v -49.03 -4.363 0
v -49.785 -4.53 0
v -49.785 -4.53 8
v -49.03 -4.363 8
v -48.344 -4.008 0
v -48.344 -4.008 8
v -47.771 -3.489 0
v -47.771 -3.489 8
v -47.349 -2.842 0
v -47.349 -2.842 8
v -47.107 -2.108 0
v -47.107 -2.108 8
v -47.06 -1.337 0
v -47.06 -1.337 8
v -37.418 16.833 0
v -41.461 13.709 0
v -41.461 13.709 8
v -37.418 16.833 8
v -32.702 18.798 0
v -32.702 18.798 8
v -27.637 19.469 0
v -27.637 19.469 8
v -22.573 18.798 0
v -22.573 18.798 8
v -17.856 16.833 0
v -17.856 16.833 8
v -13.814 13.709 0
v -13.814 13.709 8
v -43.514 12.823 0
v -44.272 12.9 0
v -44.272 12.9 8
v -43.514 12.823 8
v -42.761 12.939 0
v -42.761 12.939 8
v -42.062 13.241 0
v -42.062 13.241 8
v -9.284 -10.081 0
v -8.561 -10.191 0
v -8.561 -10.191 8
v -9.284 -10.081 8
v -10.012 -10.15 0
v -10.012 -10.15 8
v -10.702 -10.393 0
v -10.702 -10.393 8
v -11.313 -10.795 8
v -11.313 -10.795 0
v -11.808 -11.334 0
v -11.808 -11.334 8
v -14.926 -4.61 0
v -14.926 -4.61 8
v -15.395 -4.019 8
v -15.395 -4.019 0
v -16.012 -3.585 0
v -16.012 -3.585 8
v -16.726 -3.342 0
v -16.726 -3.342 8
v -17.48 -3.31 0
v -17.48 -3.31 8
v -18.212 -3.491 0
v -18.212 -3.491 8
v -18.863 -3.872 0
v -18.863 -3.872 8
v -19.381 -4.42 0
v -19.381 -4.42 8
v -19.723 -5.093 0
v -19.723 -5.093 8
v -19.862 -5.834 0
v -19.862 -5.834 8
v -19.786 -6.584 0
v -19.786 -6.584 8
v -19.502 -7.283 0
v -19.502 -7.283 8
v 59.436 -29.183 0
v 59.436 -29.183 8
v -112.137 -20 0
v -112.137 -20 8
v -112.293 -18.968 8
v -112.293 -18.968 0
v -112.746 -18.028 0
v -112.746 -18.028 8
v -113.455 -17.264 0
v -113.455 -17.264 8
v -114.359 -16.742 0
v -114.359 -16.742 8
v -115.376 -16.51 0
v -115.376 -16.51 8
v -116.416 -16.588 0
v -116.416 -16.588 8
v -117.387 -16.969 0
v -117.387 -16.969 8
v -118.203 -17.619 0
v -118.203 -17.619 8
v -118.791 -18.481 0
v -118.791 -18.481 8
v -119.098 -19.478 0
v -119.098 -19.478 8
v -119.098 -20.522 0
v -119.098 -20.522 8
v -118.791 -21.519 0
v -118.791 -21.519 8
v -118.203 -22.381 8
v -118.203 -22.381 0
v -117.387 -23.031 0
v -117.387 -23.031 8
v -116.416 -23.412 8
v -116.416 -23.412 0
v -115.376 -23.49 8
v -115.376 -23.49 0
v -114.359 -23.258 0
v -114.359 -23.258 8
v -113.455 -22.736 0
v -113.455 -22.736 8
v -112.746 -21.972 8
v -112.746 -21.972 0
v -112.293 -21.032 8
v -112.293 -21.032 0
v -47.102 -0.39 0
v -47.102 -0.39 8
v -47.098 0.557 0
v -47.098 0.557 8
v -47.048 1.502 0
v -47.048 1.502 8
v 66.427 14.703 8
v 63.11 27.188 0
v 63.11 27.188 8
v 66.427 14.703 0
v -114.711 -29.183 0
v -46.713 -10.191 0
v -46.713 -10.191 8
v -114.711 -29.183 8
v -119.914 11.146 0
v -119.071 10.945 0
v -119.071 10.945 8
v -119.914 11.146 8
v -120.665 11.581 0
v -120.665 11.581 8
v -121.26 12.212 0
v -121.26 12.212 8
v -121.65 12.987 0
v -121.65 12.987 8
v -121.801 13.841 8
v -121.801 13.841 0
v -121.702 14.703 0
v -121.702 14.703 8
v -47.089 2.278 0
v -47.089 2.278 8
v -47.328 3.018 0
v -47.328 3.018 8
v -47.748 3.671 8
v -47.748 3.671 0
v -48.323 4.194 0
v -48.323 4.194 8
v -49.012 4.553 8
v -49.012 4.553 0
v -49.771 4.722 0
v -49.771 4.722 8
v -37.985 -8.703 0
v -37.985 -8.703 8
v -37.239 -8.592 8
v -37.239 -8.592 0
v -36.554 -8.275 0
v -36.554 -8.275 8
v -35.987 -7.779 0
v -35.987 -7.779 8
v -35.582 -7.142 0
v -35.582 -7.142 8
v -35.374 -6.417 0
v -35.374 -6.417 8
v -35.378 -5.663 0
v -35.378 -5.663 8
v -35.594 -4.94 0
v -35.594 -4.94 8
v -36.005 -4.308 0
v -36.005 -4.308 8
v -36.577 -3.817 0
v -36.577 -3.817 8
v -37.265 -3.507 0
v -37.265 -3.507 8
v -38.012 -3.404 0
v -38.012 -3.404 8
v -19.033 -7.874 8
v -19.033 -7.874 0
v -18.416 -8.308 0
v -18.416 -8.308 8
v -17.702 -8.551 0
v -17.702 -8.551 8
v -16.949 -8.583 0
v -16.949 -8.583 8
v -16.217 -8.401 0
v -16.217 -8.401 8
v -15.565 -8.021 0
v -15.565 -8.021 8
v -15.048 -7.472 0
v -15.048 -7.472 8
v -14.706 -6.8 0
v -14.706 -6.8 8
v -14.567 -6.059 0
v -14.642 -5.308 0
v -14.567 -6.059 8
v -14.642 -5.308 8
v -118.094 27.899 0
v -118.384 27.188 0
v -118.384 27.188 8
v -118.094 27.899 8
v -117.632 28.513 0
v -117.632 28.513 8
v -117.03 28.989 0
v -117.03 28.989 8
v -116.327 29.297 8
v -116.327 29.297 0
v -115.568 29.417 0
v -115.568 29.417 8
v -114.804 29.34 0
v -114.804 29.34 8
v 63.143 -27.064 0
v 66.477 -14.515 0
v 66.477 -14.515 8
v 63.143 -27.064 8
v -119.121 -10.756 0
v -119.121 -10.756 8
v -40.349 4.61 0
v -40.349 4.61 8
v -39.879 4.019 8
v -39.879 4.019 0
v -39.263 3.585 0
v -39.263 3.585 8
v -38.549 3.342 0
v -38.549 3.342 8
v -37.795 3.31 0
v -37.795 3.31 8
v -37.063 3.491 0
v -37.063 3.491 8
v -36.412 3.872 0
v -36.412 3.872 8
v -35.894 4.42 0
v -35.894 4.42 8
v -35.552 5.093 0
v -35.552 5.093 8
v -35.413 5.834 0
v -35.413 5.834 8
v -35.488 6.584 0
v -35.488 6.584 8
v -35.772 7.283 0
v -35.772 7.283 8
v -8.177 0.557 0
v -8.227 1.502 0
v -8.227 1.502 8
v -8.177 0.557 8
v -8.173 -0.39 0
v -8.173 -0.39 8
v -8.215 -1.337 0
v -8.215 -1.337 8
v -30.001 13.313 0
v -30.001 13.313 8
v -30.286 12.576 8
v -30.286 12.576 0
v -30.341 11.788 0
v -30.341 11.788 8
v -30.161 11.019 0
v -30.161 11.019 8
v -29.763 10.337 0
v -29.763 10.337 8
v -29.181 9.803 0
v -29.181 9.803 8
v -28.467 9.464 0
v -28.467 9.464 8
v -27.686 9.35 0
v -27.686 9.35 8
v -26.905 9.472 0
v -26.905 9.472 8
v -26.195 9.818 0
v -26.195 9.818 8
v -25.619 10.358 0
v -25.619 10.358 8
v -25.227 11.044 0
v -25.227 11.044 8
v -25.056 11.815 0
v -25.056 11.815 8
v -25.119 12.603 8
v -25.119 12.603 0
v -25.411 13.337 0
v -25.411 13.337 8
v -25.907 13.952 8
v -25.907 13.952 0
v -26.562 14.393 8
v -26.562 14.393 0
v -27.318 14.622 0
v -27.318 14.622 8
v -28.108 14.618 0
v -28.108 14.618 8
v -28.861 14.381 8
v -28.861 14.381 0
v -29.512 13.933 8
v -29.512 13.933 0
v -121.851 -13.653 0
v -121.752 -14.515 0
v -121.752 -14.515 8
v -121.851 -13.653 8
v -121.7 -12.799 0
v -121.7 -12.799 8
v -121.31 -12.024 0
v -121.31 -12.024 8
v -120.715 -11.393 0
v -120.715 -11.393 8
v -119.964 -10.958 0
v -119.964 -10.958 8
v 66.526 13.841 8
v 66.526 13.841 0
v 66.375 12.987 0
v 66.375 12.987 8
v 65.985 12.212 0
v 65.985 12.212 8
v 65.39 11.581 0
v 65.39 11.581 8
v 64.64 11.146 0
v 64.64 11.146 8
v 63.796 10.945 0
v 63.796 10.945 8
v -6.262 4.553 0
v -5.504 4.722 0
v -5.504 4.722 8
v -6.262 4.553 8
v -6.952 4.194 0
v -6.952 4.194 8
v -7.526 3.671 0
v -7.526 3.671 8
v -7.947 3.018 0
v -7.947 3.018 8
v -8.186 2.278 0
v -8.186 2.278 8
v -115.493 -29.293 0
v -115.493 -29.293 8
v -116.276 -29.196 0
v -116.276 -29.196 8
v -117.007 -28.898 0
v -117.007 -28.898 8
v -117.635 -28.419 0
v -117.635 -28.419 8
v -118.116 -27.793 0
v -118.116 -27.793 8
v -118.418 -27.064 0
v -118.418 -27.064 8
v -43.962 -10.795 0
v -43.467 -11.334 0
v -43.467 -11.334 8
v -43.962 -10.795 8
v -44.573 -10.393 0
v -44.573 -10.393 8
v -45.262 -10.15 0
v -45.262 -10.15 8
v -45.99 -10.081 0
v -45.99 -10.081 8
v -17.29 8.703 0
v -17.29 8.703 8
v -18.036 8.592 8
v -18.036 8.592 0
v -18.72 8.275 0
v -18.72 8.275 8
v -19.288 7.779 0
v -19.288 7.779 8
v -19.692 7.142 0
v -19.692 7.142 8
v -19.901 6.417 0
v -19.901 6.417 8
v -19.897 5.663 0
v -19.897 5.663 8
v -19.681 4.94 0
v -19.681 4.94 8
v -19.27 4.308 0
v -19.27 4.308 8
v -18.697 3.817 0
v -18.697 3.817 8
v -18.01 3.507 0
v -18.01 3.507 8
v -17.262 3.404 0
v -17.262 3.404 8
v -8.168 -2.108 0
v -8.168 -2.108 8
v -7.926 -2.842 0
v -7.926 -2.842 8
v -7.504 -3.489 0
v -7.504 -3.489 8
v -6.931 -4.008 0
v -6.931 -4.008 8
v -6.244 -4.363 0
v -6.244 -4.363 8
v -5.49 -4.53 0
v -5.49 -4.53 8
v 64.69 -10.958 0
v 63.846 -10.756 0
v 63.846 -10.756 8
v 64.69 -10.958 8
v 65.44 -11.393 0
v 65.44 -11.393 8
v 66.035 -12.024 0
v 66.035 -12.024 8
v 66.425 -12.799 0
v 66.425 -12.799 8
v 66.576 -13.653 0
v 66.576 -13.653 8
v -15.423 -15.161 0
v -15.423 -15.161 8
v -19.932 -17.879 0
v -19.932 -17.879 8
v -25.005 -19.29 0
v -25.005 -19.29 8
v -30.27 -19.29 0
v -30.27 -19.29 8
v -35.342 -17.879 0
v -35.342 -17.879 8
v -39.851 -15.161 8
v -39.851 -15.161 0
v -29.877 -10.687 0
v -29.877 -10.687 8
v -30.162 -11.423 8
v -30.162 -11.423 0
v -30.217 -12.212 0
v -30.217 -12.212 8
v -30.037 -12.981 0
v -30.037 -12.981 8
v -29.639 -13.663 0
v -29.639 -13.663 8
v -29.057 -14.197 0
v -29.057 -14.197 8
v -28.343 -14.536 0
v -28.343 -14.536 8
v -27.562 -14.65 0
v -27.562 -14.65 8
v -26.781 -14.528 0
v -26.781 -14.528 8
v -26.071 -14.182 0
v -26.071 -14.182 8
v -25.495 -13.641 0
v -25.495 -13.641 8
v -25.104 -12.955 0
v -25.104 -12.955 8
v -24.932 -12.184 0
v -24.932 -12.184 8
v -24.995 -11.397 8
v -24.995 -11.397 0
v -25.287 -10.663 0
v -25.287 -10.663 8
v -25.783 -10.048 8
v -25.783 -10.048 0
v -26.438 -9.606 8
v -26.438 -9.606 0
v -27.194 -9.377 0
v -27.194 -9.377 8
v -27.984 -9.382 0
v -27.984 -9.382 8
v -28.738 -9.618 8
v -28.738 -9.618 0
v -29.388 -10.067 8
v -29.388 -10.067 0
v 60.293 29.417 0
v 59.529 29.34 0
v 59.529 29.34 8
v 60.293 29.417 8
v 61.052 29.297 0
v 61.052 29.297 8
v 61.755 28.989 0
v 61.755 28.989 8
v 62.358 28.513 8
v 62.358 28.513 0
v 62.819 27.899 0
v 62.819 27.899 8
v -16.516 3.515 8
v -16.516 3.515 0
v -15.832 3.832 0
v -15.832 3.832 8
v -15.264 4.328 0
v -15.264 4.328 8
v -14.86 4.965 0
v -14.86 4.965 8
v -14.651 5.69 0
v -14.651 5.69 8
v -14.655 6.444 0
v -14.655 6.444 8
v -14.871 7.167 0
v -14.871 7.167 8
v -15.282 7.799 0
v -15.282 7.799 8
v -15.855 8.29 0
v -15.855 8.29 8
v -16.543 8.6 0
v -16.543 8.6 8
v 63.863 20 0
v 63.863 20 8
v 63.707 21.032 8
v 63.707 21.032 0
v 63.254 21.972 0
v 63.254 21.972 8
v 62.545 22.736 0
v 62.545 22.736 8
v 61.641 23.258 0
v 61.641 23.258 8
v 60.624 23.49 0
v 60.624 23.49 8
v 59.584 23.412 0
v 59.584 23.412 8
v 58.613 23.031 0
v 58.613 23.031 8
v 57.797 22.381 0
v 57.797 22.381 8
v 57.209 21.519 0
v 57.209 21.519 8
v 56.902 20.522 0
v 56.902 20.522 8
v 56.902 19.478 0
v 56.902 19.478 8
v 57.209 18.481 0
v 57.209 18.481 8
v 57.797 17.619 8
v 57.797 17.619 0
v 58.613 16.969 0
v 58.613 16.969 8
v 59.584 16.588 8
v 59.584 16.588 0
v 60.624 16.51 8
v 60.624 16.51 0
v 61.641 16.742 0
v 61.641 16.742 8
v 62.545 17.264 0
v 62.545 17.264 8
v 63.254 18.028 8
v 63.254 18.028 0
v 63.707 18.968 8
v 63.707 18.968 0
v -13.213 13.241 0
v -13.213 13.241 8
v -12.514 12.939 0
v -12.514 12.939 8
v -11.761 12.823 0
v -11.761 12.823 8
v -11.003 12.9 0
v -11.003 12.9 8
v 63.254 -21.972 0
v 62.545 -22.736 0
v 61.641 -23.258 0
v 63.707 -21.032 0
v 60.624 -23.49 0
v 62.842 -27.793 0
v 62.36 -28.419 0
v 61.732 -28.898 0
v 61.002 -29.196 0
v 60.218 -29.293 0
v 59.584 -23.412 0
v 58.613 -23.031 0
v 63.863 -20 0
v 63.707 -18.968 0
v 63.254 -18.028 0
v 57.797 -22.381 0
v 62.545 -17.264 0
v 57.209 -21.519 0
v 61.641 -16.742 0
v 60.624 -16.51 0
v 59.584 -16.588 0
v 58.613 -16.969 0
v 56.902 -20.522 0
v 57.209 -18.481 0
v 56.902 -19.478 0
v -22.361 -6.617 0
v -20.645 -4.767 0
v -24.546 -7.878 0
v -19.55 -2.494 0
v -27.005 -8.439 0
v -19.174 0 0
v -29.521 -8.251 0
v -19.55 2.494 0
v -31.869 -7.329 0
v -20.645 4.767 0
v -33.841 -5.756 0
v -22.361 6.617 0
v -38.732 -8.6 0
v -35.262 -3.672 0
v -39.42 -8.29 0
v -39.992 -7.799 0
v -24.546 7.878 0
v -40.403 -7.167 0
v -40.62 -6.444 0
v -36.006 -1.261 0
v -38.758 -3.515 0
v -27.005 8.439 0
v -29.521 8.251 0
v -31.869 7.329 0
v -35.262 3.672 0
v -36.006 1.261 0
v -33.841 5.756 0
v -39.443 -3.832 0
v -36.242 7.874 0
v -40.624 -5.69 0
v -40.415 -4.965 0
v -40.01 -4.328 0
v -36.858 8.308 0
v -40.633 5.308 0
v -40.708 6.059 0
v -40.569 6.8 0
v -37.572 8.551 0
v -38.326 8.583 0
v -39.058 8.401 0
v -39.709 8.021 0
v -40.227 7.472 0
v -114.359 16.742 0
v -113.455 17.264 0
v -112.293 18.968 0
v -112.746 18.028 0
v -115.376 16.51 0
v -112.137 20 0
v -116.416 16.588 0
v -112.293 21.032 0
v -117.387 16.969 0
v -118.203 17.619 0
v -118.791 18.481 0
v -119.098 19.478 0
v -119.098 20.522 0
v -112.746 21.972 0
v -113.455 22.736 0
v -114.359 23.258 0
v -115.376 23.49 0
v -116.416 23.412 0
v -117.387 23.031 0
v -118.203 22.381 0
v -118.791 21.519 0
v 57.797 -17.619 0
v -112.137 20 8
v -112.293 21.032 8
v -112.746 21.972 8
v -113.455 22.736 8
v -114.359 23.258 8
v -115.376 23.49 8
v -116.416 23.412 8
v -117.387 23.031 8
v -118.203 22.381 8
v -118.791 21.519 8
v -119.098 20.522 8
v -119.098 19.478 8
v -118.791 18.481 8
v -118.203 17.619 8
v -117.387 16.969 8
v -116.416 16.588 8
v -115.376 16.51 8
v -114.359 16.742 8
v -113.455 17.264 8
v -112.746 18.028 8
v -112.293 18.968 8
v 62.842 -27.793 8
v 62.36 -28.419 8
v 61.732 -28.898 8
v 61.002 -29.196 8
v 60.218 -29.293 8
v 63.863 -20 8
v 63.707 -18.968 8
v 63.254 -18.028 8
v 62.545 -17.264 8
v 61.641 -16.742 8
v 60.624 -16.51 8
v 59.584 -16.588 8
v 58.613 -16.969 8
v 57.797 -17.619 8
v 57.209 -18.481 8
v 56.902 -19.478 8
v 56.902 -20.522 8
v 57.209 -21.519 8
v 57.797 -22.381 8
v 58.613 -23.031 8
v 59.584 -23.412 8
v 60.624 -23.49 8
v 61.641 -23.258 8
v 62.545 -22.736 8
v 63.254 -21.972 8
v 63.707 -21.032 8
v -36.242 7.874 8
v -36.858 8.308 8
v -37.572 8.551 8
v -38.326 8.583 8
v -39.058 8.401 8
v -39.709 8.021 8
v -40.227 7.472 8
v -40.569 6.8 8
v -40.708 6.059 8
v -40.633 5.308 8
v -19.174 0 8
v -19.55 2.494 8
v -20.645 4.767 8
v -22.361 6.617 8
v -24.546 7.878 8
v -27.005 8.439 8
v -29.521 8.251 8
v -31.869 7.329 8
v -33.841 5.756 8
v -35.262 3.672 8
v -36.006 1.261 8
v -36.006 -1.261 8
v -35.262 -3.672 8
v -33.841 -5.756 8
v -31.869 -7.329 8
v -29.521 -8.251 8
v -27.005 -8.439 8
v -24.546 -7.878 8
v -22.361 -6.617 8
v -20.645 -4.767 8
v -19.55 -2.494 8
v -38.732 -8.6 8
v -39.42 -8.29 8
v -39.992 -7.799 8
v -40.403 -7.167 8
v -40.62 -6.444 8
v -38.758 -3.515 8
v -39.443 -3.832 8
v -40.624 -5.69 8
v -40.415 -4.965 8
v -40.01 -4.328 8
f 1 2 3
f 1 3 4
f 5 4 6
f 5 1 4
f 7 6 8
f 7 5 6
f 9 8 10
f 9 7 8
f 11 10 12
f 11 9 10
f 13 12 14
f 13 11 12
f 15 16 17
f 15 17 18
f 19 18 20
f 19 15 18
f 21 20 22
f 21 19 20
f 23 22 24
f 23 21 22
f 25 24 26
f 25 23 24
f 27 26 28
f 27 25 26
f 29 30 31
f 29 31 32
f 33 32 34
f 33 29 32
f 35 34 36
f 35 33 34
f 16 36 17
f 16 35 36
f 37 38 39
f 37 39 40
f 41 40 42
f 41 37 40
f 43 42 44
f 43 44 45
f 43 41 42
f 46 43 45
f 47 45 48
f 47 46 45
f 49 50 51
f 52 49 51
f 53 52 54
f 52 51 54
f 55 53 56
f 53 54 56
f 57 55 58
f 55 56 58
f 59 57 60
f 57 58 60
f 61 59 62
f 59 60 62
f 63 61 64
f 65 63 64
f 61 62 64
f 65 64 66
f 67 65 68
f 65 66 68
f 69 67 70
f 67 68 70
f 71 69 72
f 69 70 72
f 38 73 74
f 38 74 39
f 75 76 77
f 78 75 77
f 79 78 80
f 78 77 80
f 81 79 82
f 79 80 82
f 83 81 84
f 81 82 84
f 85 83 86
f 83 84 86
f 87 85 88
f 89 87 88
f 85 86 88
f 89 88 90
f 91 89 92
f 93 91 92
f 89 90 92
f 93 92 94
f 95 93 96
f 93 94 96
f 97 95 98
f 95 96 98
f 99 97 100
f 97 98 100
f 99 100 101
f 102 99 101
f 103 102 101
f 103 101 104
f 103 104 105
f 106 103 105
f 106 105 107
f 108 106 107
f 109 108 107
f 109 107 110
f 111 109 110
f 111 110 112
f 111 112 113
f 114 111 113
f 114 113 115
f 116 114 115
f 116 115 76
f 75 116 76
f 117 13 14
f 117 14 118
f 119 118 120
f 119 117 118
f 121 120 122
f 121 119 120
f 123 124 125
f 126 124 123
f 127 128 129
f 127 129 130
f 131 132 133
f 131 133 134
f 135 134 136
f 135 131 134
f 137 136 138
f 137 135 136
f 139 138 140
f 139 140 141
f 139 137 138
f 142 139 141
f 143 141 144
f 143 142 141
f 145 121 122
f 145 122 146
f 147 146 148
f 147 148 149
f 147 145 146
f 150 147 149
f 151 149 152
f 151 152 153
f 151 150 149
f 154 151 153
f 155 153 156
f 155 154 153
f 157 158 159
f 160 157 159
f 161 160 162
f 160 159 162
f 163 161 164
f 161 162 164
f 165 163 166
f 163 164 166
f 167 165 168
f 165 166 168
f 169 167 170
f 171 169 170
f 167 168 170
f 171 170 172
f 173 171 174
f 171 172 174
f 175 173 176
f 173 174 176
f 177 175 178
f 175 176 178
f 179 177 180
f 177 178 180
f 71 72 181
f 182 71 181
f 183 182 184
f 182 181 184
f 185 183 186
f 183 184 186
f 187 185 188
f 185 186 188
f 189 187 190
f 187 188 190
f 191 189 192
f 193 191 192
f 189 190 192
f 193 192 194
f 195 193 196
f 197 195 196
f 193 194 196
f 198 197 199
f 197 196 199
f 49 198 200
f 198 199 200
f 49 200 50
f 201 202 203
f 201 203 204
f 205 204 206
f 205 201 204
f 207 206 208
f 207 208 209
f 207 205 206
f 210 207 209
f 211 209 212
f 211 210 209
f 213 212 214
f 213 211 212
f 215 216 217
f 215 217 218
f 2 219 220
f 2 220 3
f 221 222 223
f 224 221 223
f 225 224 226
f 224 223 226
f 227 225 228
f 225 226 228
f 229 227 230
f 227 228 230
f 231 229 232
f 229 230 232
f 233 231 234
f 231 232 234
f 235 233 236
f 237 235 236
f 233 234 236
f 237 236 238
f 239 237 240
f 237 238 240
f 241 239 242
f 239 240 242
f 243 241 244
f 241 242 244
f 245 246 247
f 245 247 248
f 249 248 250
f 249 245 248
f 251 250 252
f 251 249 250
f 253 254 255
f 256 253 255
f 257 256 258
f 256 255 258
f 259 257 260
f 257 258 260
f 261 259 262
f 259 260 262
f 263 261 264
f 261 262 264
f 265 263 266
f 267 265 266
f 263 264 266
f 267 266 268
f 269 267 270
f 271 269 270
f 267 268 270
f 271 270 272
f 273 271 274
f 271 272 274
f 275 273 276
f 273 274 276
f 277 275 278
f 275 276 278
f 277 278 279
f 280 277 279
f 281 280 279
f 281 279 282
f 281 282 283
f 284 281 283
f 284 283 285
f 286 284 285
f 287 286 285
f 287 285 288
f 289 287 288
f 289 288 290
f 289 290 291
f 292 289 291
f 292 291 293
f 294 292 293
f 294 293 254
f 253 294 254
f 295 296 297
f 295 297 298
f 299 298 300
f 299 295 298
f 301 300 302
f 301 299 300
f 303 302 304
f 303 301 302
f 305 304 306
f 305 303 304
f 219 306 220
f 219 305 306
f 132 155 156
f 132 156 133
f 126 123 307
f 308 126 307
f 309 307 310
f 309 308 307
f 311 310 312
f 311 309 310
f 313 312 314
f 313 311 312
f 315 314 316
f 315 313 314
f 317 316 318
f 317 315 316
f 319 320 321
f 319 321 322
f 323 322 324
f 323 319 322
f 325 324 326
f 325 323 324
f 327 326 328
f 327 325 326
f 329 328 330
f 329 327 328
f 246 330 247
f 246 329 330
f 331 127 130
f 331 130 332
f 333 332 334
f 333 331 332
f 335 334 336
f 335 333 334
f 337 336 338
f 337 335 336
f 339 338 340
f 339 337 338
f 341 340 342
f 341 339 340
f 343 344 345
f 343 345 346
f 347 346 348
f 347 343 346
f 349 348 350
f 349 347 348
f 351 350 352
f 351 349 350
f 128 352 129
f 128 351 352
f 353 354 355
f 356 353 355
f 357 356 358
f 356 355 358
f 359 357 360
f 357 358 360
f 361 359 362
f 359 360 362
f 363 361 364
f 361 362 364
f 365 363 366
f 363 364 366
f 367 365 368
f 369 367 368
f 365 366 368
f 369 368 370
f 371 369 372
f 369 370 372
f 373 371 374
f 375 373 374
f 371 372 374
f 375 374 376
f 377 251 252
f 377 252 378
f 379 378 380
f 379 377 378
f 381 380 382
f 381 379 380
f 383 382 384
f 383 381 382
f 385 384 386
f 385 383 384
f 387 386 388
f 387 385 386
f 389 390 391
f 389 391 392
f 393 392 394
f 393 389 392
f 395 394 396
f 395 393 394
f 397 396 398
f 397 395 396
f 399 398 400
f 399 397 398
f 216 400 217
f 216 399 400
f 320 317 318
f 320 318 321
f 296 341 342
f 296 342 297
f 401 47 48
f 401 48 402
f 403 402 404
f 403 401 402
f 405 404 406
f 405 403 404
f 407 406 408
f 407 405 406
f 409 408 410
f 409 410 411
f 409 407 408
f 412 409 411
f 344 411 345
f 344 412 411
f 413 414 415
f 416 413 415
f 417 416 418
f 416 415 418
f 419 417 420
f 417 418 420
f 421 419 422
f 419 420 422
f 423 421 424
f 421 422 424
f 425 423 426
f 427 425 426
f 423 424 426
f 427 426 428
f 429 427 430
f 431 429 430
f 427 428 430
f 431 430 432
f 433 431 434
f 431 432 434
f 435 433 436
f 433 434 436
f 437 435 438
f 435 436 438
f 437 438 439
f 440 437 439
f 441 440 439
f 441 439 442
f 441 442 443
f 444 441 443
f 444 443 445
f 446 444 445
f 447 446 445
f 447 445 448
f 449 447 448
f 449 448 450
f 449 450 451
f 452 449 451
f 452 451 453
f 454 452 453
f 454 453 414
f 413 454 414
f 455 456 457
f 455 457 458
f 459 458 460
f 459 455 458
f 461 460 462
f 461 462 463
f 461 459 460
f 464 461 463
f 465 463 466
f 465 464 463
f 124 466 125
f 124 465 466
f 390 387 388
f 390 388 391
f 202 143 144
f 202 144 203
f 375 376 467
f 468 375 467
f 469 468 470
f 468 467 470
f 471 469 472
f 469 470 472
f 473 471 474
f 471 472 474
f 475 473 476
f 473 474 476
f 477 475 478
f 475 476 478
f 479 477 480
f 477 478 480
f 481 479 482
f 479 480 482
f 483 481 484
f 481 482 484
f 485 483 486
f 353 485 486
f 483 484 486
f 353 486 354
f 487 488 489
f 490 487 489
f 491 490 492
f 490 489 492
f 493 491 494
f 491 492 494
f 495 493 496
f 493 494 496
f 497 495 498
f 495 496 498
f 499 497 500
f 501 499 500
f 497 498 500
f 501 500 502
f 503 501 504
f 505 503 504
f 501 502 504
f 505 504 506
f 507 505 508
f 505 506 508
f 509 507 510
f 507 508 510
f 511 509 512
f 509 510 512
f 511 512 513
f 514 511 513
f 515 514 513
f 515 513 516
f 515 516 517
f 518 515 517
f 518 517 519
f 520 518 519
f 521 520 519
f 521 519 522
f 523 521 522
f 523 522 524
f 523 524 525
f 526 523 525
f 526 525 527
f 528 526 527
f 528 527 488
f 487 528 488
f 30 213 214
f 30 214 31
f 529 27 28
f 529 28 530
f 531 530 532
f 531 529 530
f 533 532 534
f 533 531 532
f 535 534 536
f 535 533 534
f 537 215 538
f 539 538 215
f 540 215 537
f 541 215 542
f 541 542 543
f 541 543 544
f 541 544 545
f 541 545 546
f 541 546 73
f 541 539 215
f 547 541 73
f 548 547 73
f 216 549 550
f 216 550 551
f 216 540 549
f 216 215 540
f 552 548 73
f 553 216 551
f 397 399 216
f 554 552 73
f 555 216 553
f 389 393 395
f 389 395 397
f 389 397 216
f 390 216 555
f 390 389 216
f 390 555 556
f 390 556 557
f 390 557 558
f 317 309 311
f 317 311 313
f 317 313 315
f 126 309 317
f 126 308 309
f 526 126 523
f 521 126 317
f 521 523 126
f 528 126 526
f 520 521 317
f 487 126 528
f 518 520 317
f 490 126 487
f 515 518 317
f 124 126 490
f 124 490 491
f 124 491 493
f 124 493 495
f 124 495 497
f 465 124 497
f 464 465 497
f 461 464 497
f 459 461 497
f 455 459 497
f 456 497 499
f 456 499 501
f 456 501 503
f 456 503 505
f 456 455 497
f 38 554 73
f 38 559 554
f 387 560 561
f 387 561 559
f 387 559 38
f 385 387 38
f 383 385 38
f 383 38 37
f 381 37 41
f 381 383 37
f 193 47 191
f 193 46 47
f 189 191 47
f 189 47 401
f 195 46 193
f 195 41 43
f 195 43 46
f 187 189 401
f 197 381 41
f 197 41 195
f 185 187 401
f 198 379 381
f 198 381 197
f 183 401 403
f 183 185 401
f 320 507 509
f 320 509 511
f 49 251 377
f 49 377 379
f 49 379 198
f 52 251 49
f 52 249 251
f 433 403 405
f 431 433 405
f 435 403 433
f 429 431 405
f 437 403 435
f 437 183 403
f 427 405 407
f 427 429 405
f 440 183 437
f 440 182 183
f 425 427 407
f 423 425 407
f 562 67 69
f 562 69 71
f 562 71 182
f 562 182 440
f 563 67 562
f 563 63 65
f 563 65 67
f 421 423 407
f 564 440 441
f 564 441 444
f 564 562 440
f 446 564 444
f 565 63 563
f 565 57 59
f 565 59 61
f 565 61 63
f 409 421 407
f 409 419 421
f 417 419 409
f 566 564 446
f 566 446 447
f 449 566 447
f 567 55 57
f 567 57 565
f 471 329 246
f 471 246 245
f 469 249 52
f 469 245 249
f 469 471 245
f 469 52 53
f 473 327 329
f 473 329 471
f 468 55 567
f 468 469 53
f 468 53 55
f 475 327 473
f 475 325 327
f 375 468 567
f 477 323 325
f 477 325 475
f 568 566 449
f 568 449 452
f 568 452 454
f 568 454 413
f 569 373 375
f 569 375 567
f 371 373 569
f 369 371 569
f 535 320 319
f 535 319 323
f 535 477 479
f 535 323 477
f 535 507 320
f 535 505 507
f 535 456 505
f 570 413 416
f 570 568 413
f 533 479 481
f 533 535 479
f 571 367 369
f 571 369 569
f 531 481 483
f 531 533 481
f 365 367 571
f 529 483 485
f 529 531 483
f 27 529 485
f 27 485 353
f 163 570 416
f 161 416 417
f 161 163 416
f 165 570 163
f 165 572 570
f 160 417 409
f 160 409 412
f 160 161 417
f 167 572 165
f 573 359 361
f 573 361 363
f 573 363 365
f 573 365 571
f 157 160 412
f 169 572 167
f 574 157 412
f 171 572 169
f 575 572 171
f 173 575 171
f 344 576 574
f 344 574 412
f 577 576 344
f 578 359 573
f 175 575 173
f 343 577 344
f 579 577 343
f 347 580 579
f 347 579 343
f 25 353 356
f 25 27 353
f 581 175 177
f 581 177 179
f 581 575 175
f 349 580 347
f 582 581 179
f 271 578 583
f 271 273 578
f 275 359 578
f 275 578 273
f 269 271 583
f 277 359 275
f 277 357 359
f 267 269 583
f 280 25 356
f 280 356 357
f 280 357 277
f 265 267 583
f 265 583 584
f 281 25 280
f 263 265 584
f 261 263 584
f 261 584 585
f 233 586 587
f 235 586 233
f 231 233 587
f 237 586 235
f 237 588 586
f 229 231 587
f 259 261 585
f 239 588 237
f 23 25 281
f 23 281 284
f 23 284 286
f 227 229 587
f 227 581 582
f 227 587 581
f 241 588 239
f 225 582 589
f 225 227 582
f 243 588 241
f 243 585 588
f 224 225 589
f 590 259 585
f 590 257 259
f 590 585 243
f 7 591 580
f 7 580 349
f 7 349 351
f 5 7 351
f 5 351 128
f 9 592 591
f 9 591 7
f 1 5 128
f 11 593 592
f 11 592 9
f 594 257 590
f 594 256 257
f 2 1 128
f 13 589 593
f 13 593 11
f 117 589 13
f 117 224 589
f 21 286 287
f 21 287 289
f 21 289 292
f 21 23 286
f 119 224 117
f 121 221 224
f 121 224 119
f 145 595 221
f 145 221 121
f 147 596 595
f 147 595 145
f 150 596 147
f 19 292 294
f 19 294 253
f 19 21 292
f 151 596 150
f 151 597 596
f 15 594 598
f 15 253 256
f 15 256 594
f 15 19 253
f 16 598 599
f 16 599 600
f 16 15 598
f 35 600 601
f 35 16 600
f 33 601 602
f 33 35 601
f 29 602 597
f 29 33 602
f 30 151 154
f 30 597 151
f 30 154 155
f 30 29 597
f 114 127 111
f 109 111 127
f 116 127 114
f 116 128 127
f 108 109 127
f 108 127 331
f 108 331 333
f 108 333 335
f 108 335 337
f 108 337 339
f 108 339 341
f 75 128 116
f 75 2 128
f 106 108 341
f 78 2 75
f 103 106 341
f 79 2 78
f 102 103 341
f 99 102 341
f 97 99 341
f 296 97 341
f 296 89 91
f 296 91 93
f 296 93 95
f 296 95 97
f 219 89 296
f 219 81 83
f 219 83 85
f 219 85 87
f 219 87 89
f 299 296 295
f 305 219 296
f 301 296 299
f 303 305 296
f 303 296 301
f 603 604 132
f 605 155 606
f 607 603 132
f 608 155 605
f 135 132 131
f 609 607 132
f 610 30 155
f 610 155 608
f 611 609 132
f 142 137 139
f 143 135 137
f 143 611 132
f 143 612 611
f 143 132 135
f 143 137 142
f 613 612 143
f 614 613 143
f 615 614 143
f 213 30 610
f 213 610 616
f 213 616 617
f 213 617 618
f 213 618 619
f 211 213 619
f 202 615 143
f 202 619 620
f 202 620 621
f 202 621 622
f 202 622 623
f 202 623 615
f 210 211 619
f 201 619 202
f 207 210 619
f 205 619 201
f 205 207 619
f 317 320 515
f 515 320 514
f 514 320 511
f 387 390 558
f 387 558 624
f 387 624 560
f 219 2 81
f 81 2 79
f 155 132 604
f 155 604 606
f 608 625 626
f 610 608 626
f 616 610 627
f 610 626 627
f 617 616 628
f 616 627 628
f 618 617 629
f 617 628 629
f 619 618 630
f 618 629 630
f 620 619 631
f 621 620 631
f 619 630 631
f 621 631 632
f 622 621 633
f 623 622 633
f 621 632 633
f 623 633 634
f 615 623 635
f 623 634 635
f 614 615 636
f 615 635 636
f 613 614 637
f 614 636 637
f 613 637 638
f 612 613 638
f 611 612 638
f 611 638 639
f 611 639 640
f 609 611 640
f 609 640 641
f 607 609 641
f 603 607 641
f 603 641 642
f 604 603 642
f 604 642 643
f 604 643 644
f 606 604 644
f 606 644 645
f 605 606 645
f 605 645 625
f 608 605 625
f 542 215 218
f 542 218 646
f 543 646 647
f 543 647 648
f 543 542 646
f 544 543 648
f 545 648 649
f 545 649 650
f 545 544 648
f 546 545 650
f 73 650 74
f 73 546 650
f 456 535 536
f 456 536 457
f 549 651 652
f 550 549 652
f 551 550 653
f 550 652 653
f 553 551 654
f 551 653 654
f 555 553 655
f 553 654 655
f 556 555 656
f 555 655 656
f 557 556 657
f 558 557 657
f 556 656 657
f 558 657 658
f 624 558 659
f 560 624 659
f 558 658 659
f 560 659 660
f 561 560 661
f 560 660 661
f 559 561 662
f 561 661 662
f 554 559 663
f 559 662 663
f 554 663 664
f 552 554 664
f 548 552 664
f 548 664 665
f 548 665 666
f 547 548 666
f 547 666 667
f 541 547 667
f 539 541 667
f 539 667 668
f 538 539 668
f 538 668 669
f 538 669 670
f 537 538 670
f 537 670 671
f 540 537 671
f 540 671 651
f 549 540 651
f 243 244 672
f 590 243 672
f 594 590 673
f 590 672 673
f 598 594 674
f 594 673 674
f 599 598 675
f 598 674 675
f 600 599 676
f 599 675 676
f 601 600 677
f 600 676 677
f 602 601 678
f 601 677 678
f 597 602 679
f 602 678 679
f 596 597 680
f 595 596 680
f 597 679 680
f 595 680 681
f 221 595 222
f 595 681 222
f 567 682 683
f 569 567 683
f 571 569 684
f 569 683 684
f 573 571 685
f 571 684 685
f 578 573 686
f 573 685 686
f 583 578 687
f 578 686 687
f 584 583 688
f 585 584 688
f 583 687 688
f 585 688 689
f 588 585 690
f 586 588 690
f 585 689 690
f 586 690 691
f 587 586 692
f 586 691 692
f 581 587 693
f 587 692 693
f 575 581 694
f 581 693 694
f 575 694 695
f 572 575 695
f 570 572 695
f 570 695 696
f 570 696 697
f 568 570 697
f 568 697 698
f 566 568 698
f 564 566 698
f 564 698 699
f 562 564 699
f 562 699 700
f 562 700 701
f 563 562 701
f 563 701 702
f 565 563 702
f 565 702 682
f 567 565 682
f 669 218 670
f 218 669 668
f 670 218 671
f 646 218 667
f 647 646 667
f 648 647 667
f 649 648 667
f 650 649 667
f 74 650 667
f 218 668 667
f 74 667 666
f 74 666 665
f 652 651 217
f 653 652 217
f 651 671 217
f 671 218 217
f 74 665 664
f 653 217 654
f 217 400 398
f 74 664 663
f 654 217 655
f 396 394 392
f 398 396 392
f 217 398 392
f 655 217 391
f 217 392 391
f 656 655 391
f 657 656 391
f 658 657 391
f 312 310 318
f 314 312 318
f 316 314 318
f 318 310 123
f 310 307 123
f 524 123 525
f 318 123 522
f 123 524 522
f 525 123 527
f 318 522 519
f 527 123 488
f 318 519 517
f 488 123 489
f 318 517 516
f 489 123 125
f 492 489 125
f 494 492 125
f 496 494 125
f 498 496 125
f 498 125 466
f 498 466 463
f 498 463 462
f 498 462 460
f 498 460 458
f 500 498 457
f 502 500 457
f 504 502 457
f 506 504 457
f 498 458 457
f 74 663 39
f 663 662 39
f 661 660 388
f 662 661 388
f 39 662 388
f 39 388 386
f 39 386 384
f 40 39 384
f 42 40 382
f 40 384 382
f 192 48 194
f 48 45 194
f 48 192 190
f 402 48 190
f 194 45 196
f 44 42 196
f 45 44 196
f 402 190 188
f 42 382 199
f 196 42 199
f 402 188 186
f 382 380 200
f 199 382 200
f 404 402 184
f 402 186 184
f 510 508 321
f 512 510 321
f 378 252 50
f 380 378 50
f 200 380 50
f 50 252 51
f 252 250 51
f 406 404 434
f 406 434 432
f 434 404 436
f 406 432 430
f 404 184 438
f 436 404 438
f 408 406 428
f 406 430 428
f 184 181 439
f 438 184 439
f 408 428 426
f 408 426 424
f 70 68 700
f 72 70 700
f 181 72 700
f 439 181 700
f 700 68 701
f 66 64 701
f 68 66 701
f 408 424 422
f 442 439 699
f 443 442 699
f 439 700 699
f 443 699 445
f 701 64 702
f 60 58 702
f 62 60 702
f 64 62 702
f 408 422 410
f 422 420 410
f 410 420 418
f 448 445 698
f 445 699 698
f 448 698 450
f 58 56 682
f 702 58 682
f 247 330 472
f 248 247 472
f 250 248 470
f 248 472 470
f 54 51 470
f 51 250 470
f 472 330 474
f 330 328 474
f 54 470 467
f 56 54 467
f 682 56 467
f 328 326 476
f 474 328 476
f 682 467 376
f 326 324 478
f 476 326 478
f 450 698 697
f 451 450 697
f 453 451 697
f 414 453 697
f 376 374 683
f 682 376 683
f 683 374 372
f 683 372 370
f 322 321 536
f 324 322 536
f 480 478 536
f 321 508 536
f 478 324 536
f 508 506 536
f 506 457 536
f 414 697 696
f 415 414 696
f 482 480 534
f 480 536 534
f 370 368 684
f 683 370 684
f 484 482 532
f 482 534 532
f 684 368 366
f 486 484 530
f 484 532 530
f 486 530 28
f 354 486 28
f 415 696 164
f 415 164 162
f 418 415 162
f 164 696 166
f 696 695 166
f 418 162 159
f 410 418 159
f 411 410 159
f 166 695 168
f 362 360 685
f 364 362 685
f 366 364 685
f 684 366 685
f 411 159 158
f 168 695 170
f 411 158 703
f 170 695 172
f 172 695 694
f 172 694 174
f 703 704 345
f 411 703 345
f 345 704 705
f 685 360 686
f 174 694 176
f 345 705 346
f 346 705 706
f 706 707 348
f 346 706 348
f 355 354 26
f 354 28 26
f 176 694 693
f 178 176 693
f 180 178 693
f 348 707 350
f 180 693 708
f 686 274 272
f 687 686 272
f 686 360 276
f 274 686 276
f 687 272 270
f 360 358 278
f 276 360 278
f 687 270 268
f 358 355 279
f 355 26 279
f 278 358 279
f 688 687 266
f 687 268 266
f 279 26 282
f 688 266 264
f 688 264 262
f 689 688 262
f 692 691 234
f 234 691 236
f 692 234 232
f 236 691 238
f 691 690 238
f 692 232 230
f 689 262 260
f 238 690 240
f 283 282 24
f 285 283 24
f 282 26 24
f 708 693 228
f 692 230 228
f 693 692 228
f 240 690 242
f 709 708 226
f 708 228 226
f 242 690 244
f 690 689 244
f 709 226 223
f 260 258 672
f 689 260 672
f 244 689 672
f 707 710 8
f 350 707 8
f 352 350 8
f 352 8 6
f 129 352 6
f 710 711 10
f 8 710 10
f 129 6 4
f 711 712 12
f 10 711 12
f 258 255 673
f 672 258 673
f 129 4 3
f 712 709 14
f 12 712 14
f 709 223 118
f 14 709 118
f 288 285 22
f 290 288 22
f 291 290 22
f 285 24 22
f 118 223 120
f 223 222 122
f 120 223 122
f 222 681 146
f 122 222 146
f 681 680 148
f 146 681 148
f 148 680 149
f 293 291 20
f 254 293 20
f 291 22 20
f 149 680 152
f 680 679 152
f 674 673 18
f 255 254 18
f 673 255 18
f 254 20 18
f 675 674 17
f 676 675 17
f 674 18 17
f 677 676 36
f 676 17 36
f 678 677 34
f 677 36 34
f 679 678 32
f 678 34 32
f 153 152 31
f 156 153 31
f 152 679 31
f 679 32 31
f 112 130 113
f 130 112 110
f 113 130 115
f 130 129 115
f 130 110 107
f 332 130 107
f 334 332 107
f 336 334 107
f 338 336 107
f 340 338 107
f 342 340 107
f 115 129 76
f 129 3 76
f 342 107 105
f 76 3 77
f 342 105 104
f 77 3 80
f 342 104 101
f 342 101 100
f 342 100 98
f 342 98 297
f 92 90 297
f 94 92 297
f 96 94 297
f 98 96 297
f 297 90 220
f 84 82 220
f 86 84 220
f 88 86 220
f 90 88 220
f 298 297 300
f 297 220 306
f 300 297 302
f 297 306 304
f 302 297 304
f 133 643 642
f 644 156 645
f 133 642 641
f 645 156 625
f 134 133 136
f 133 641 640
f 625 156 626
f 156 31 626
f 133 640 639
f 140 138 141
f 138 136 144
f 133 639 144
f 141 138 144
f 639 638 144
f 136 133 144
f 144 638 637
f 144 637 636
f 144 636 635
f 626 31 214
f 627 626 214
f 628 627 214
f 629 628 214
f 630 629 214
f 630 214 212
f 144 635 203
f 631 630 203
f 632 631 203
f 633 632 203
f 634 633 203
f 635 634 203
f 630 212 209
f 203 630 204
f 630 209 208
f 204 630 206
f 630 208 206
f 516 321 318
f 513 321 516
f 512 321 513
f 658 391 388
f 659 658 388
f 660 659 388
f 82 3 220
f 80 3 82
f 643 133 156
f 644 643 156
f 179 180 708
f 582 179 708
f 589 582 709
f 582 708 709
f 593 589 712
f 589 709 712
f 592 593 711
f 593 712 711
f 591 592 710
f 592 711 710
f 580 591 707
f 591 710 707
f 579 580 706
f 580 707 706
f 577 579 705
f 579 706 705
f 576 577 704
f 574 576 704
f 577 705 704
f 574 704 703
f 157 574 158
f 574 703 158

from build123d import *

# Parameters (mm, degrees)
EXTRUDE_2_DEPTH     = 8
SKETCH_4_R          = 3.5
SKETCH_4_R_2        = 8.462893534
CUT_EXTRUDE_1_DEPTH = 126.60827275


with BuildPart() as part:
    # 草图1 → 凸台-拉伸2 (new body)
    with BuildSketch(Plane.XY):
        with BuildLine():
            ThreePointArc((-44.271832455, 12.900159535), (-42.760990151, 12.93891125), (-41.460762065, 13.709335217))
            ThreePointArc((-41.460762065, 13.709335217), (-27.63735599, 19.468755163), (-13.813949915, 13.709335217))
            ThreePointArc((-13.813949915, 13.709335217), (-12.513721829, 12.93891125), (-11.002879525, 12.900159535))
            Line((-11.002879525, 12.900159535), (59.529347881, 29.339622898))
            ThreePointArc((59.529347881, 29.339622898), (61.75543851, 28.989437599), (63.109724345, 27.188321525))
            Line((63.109724345, 27.188321525), (66.427142402, 14.703033787))
            ThreePointArc((66.427142402, 14.703033787), (65.985368626, 12.212155416), (63.796050229, 10.944668104))
            Line((63.796050229, 10.944668104), (-5.503908774, 4.721894109))
            ThreePointArc((-5.503908774, 4.721894109), (-7.526265644, 3.671148438), (-8.226657796, 1.502405805))
            ThreePointArc((-8.226657796, 1.502405805), (-8.168778443, 0.083161809), (-8.214531044, -1.33652486))
            ThreePointArc((-8.214531044, -1.33652486), (-7.503974356, -3.489473399), (-5.489913373, -4.530452062))
            Line((-5.489913373, -4.530452062), (63.846058336, -10.75645981))
            ThreePointArc((63.846058336, -10.75645981), (66.035376732, -12.023947122), (66.477150508, -14.514825493))
            Line((66.477150508, -14.514825493), (63.142843844, -27.063674443))
            ThreePointArc((63.142843844, -27.063674443), (61.732433193, -28.897690671), (59.436427456, -29.182701869))
            Line((59.436427456, -29.182701869), (-8.561409136, -10.190770239))
            ThreePointArc((-8.561409136, -10.190770239), (-10.364737659, -10.250456004), (-11.807672821, -11.33373541))
            ThreePointArc((-11.807672821, -11.33373541), (-27.63735599, -19.468755163), (-43.467039159, -11.33373541))
            ThreePointArc((-43.467039159, -11.33373541), (-44.909974321, -10.250456004), (-46.713302844, -10.190770239))
            Line((-46.713302844, -10.190770239), (-114.711139436, -29.182701869))
            ThreePointArc((-114.711139436, -29.182701869), (-117.007145173, -28.897690671), (-118.417555824, -27.063674443))
            Line((-118.417555824, -27.063674443), (-121.751862488, -14.514825493))
            ThreePointArc((-121.751862488, -14.514825493), (-121.310088712, -12.023947122), (-119.120770315, -10.75645981))
            Line((-119.120770315, -10.75645981), (-49.784798606, -4.530452062))
            ThreePointArc((-49.784798606, -4.530452062), (-47.770737623, -3.489473399), (-47.060180936, -1.33652486))
            ThreePointArc((-47.060180936, -1.33652486), (-47.105933537, 0.083161809), (-47.048054184, 1.502405805))
            ThreePointArc((-47.048054184, 1.502405805), (-47.748446336, 3.671148438), (-49.770803206, 4.721894109))
            Line((-49.770803206, 4.721894109), (-119.070762209, 10.944668104))
            ThreePointArc((-119.070762209, 10.944668104), (-121.260080606, 12.212155416), (-121.701854382, 14.703033787))
            Line((-121.701854382, 14.703033787), (-118.384436325, 27.188321525))
            ThreePointArc((-118.384436325, 27.188321525), (-117.03015049, 28.989437599), (-114.804059861, 29.339622898))
            Line((-114.804059861, 29.339622898), (-44.271832455, 12.900159535))
        make_face()
    extrude(amount=EXTRUDE_2_DEPTH)

    # 草图4 → 切除-拉伸1 (cut, through all)
    with BuildSketch(Plane.XY.offset(8)):
        with Locations((-115.63735599, -20)):
            Circle(SKETCH_4_R)
        with Locations((-115.63735599, 20)):
            Circle(SKETCH_4_R)
        with Locations((60.36264401, -20)):
            Circle(SKETCH_4_R)
        with Locations((60.36264401, 20)):
            Circle(SKETCH_4_R)
        with Locations((-27.63735599, 0)):
            Circle(SKETCH_4_R_2)
        with BuildLine():
            ThreePointArc((-37.984908909, -8.703484854), (-35.348611937, -6.039852319), (-38.012244471, -3.403555348))
            ThreePointArc((-38.012244471, -3.403555348), (-40.648541443, -6.067187882), (-37.984908909, -8.703484854))
        make_face()
        with BuildLine():
            ThreePointArc((-25.273693465, -13.312986121), (-26.26231842, -9.698069705), (-29.877234836, -10.68669466))
            ThreePointArc((-29.877234836, -10.68669466), (-28.888609881, -14.301611076), (-25.273693465, -13.312986121))
        make_face()
        with BuildLine():
            ThreePointArc((-19.502346355, -7.283139312), (-15.877424428, -8.234423195), (-14.926140546, -4.609501268))
            ThreePointArc((-14.926140546, -4.609501268), (-18.551062473, -3.658217385), (-19.502346355, -7.283139312))
        make_face()
        with BuildLine():
            ThreePointArc((-17.262467509, 3.403555348), (-14.626170537, 6.067187882), (-17.289803071, 8.703484854))
            ThreePointArc((-17.289803071, 8.703484854), (-19.926100043, 6.039852319), (-17.262467509, 3.403555348))
        make_face()
        with BuildLine():
            ThreePointArc((-25.397477144, 10.68669466), (-26.386102099, 14.301611076), (-30.001018515, 13.312986121))
            ThreePointArc((-30.001018515, 13.312986121), (-29.01239356, 9.698069705), (-25.397477144, 10.68669466))
        make_face()
        with BuildLine():
            ThreePointArc((-35.772365625, 7.283139312), (-39.397287552, 8.234423195), (-40.348571434, 4.609501268))
            ThreePointArc((-40.348571434, 4.609501268), (-36.723649507, 3.658217385), (-35.772365625, 7.283139312))
        make_face()
    extrude(amount=-CUT_EXTRUDE_1_DEPTH, mode=Mode.SUBTRACT)


solid = part.part
